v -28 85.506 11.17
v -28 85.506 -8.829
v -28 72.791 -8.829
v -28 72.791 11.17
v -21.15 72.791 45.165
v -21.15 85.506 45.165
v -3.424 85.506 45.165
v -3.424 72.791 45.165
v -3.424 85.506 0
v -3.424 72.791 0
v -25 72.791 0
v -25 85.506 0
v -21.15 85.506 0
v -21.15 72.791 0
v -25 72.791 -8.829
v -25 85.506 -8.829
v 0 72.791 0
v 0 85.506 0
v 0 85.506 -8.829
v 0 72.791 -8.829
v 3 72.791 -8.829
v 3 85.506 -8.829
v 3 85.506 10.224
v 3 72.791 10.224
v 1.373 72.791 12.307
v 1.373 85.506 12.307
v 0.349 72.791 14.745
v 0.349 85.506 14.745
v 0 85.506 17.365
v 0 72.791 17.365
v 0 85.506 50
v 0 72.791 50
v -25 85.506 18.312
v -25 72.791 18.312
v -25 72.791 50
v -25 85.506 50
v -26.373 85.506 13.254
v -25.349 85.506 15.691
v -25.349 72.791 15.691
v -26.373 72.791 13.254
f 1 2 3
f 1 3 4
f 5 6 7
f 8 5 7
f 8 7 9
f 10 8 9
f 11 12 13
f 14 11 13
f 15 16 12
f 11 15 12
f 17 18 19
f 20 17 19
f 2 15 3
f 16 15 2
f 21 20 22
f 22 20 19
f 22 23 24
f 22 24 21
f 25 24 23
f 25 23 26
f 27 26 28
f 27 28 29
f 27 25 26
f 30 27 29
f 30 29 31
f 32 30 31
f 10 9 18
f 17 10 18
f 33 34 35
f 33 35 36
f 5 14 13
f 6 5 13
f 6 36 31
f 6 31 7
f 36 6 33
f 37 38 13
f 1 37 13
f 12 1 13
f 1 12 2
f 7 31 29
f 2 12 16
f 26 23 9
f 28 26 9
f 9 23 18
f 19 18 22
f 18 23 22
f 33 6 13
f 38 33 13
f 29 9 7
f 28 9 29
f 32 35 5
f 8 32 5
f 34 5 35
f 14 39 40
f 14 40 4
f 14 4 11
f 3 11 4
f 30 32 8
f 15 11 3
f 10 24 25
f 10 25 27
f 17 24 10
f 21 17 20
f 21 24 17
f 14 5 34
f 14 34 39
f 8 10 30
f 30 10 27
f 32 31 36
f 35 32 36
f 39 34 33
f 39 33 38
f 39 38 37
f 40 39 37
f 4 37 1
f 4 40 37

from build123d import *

# Parameters (mm, degrees)
SKETCH1_W           = 3.85
SKETCH1_H           = 12.714938244
BOSS_EXTRUDE1_DEPTH = 50
BOSS_EXTRUDE2_DEPTH = 12.714938244
SKETCH4_W           = 19.052451889
SKETCH4_H           = 12.714938244
BOSS_EXTRUDE3_DEPTH = 3
FILLET1_R           = 10
SKETCH5_W           = 19.999198202
SKETCH5_H           = 12.714938244
BOSS_EXTRUDE4_DEPTH = 3
FILLET2_R           = 10


with BuildPart() as part:
    # Sketch1 → Boss-Extrude1 (new body)
    with BuildSketch(Plane.XY):
        with Locations((-23.075, 79.148527214)):
            Rectangle(SKETCH1_W, SKETCH1_H)
    extrude(amount=BOSS_EXTRUDE1_DEPTH)

    # Sketch3 → Boss-Extrude2 (add)
    with BuildSketch(Plane(origin=(0, 85.505996336, 0), x_dir=(1, 0, 0), z_dir=(0, 1, 0))):
        Polygon((-21.15, -45.165463377), (-3.42398491, -45.165463377), (-3.42398491, 0), (0, 0), (0, -50), (-21.15, -50), align=None)
    extrude(amount=-BOSS_EXTRUDE2_DEPTH)

    # Sketch4 → Boss-Extrude3 (add)
    with BuildSketch(Plane(origin=(0, 0, 0), x_dir=(0, 0, -1), z_dir=(1, 0, 0))):
        with Locations((-0.697437539, 79.148527214)):
            Rectangle(SKETCH4_W, SKETCH4_H)
    extrude(amount=BOSS_EXTRUDE3_DEPTH)

    # Fillet1
    # the kernel refuses this fillet: 10 mm, written as the material it adds along each edge
    with BuildSketch(Plane(origin=(0, 72.791058092, 10.223663483), x_dir=(0, 0, 1), z_dir=(0, 1, 0))) as fillet1_piece_1:
        with BuildLine():
            CenterArc((7.141428429, 10), FILLET1_R, 224.427004001, 45.572995999)
            Line((0, 3), (-0.142828569, 2.86))
            ThreePointArc((-0.142828569, 2.86), (-0.2, 1.5), (-0.2, 0))
            Line((-0.2, 0), (0, -0.2))
            Line((0, -0.2), (7.141428429, -0.2))
            Line((7.141428429, -0.2), (7.141428429, 0))
        make_face()
    extrude(amount=12.714938244)

    # Sketch5 → Boss-Extrude4 (add)
    with BuildSketch(Plane.ZY.offset(25)):
        with Locations((1.170810695, 79.148527214)):
            Rectangle(SKETCH5_W, SKETCH5_H)
    extrude(amount=BOSS_EXTRUDE4_DEPTH)

    # Fillet2
    # the kernel refuses this fillet: 10 mm, written as the material it adds along each edge
    with BuildSketch(Plane(origin=(-25, 72.791058092, 11.170409796), x_dir=(0, 0, 1), z_dir=(0, 1, 0))) as fillet2_piece_1:
        with BuildLine():
            CenterArc((7.141428429, -10), FILLET2_R, 90, 45.572995999)
            Line((0, -3), (-0.142828569, -2.86))
            ThreePointArc((-0.142828569, -2.86), (-0.2, -1.5), (-0.2, 0))
            Line((-0.2, 0), (0, 0.2))
            Line((0, 0.2), (7.141428429, 0.2))
            Line((7.141428429, 0.2), (7.141428429, 0))
        make_face()
    extrude(amount=12.714938244)


solid = part.part
